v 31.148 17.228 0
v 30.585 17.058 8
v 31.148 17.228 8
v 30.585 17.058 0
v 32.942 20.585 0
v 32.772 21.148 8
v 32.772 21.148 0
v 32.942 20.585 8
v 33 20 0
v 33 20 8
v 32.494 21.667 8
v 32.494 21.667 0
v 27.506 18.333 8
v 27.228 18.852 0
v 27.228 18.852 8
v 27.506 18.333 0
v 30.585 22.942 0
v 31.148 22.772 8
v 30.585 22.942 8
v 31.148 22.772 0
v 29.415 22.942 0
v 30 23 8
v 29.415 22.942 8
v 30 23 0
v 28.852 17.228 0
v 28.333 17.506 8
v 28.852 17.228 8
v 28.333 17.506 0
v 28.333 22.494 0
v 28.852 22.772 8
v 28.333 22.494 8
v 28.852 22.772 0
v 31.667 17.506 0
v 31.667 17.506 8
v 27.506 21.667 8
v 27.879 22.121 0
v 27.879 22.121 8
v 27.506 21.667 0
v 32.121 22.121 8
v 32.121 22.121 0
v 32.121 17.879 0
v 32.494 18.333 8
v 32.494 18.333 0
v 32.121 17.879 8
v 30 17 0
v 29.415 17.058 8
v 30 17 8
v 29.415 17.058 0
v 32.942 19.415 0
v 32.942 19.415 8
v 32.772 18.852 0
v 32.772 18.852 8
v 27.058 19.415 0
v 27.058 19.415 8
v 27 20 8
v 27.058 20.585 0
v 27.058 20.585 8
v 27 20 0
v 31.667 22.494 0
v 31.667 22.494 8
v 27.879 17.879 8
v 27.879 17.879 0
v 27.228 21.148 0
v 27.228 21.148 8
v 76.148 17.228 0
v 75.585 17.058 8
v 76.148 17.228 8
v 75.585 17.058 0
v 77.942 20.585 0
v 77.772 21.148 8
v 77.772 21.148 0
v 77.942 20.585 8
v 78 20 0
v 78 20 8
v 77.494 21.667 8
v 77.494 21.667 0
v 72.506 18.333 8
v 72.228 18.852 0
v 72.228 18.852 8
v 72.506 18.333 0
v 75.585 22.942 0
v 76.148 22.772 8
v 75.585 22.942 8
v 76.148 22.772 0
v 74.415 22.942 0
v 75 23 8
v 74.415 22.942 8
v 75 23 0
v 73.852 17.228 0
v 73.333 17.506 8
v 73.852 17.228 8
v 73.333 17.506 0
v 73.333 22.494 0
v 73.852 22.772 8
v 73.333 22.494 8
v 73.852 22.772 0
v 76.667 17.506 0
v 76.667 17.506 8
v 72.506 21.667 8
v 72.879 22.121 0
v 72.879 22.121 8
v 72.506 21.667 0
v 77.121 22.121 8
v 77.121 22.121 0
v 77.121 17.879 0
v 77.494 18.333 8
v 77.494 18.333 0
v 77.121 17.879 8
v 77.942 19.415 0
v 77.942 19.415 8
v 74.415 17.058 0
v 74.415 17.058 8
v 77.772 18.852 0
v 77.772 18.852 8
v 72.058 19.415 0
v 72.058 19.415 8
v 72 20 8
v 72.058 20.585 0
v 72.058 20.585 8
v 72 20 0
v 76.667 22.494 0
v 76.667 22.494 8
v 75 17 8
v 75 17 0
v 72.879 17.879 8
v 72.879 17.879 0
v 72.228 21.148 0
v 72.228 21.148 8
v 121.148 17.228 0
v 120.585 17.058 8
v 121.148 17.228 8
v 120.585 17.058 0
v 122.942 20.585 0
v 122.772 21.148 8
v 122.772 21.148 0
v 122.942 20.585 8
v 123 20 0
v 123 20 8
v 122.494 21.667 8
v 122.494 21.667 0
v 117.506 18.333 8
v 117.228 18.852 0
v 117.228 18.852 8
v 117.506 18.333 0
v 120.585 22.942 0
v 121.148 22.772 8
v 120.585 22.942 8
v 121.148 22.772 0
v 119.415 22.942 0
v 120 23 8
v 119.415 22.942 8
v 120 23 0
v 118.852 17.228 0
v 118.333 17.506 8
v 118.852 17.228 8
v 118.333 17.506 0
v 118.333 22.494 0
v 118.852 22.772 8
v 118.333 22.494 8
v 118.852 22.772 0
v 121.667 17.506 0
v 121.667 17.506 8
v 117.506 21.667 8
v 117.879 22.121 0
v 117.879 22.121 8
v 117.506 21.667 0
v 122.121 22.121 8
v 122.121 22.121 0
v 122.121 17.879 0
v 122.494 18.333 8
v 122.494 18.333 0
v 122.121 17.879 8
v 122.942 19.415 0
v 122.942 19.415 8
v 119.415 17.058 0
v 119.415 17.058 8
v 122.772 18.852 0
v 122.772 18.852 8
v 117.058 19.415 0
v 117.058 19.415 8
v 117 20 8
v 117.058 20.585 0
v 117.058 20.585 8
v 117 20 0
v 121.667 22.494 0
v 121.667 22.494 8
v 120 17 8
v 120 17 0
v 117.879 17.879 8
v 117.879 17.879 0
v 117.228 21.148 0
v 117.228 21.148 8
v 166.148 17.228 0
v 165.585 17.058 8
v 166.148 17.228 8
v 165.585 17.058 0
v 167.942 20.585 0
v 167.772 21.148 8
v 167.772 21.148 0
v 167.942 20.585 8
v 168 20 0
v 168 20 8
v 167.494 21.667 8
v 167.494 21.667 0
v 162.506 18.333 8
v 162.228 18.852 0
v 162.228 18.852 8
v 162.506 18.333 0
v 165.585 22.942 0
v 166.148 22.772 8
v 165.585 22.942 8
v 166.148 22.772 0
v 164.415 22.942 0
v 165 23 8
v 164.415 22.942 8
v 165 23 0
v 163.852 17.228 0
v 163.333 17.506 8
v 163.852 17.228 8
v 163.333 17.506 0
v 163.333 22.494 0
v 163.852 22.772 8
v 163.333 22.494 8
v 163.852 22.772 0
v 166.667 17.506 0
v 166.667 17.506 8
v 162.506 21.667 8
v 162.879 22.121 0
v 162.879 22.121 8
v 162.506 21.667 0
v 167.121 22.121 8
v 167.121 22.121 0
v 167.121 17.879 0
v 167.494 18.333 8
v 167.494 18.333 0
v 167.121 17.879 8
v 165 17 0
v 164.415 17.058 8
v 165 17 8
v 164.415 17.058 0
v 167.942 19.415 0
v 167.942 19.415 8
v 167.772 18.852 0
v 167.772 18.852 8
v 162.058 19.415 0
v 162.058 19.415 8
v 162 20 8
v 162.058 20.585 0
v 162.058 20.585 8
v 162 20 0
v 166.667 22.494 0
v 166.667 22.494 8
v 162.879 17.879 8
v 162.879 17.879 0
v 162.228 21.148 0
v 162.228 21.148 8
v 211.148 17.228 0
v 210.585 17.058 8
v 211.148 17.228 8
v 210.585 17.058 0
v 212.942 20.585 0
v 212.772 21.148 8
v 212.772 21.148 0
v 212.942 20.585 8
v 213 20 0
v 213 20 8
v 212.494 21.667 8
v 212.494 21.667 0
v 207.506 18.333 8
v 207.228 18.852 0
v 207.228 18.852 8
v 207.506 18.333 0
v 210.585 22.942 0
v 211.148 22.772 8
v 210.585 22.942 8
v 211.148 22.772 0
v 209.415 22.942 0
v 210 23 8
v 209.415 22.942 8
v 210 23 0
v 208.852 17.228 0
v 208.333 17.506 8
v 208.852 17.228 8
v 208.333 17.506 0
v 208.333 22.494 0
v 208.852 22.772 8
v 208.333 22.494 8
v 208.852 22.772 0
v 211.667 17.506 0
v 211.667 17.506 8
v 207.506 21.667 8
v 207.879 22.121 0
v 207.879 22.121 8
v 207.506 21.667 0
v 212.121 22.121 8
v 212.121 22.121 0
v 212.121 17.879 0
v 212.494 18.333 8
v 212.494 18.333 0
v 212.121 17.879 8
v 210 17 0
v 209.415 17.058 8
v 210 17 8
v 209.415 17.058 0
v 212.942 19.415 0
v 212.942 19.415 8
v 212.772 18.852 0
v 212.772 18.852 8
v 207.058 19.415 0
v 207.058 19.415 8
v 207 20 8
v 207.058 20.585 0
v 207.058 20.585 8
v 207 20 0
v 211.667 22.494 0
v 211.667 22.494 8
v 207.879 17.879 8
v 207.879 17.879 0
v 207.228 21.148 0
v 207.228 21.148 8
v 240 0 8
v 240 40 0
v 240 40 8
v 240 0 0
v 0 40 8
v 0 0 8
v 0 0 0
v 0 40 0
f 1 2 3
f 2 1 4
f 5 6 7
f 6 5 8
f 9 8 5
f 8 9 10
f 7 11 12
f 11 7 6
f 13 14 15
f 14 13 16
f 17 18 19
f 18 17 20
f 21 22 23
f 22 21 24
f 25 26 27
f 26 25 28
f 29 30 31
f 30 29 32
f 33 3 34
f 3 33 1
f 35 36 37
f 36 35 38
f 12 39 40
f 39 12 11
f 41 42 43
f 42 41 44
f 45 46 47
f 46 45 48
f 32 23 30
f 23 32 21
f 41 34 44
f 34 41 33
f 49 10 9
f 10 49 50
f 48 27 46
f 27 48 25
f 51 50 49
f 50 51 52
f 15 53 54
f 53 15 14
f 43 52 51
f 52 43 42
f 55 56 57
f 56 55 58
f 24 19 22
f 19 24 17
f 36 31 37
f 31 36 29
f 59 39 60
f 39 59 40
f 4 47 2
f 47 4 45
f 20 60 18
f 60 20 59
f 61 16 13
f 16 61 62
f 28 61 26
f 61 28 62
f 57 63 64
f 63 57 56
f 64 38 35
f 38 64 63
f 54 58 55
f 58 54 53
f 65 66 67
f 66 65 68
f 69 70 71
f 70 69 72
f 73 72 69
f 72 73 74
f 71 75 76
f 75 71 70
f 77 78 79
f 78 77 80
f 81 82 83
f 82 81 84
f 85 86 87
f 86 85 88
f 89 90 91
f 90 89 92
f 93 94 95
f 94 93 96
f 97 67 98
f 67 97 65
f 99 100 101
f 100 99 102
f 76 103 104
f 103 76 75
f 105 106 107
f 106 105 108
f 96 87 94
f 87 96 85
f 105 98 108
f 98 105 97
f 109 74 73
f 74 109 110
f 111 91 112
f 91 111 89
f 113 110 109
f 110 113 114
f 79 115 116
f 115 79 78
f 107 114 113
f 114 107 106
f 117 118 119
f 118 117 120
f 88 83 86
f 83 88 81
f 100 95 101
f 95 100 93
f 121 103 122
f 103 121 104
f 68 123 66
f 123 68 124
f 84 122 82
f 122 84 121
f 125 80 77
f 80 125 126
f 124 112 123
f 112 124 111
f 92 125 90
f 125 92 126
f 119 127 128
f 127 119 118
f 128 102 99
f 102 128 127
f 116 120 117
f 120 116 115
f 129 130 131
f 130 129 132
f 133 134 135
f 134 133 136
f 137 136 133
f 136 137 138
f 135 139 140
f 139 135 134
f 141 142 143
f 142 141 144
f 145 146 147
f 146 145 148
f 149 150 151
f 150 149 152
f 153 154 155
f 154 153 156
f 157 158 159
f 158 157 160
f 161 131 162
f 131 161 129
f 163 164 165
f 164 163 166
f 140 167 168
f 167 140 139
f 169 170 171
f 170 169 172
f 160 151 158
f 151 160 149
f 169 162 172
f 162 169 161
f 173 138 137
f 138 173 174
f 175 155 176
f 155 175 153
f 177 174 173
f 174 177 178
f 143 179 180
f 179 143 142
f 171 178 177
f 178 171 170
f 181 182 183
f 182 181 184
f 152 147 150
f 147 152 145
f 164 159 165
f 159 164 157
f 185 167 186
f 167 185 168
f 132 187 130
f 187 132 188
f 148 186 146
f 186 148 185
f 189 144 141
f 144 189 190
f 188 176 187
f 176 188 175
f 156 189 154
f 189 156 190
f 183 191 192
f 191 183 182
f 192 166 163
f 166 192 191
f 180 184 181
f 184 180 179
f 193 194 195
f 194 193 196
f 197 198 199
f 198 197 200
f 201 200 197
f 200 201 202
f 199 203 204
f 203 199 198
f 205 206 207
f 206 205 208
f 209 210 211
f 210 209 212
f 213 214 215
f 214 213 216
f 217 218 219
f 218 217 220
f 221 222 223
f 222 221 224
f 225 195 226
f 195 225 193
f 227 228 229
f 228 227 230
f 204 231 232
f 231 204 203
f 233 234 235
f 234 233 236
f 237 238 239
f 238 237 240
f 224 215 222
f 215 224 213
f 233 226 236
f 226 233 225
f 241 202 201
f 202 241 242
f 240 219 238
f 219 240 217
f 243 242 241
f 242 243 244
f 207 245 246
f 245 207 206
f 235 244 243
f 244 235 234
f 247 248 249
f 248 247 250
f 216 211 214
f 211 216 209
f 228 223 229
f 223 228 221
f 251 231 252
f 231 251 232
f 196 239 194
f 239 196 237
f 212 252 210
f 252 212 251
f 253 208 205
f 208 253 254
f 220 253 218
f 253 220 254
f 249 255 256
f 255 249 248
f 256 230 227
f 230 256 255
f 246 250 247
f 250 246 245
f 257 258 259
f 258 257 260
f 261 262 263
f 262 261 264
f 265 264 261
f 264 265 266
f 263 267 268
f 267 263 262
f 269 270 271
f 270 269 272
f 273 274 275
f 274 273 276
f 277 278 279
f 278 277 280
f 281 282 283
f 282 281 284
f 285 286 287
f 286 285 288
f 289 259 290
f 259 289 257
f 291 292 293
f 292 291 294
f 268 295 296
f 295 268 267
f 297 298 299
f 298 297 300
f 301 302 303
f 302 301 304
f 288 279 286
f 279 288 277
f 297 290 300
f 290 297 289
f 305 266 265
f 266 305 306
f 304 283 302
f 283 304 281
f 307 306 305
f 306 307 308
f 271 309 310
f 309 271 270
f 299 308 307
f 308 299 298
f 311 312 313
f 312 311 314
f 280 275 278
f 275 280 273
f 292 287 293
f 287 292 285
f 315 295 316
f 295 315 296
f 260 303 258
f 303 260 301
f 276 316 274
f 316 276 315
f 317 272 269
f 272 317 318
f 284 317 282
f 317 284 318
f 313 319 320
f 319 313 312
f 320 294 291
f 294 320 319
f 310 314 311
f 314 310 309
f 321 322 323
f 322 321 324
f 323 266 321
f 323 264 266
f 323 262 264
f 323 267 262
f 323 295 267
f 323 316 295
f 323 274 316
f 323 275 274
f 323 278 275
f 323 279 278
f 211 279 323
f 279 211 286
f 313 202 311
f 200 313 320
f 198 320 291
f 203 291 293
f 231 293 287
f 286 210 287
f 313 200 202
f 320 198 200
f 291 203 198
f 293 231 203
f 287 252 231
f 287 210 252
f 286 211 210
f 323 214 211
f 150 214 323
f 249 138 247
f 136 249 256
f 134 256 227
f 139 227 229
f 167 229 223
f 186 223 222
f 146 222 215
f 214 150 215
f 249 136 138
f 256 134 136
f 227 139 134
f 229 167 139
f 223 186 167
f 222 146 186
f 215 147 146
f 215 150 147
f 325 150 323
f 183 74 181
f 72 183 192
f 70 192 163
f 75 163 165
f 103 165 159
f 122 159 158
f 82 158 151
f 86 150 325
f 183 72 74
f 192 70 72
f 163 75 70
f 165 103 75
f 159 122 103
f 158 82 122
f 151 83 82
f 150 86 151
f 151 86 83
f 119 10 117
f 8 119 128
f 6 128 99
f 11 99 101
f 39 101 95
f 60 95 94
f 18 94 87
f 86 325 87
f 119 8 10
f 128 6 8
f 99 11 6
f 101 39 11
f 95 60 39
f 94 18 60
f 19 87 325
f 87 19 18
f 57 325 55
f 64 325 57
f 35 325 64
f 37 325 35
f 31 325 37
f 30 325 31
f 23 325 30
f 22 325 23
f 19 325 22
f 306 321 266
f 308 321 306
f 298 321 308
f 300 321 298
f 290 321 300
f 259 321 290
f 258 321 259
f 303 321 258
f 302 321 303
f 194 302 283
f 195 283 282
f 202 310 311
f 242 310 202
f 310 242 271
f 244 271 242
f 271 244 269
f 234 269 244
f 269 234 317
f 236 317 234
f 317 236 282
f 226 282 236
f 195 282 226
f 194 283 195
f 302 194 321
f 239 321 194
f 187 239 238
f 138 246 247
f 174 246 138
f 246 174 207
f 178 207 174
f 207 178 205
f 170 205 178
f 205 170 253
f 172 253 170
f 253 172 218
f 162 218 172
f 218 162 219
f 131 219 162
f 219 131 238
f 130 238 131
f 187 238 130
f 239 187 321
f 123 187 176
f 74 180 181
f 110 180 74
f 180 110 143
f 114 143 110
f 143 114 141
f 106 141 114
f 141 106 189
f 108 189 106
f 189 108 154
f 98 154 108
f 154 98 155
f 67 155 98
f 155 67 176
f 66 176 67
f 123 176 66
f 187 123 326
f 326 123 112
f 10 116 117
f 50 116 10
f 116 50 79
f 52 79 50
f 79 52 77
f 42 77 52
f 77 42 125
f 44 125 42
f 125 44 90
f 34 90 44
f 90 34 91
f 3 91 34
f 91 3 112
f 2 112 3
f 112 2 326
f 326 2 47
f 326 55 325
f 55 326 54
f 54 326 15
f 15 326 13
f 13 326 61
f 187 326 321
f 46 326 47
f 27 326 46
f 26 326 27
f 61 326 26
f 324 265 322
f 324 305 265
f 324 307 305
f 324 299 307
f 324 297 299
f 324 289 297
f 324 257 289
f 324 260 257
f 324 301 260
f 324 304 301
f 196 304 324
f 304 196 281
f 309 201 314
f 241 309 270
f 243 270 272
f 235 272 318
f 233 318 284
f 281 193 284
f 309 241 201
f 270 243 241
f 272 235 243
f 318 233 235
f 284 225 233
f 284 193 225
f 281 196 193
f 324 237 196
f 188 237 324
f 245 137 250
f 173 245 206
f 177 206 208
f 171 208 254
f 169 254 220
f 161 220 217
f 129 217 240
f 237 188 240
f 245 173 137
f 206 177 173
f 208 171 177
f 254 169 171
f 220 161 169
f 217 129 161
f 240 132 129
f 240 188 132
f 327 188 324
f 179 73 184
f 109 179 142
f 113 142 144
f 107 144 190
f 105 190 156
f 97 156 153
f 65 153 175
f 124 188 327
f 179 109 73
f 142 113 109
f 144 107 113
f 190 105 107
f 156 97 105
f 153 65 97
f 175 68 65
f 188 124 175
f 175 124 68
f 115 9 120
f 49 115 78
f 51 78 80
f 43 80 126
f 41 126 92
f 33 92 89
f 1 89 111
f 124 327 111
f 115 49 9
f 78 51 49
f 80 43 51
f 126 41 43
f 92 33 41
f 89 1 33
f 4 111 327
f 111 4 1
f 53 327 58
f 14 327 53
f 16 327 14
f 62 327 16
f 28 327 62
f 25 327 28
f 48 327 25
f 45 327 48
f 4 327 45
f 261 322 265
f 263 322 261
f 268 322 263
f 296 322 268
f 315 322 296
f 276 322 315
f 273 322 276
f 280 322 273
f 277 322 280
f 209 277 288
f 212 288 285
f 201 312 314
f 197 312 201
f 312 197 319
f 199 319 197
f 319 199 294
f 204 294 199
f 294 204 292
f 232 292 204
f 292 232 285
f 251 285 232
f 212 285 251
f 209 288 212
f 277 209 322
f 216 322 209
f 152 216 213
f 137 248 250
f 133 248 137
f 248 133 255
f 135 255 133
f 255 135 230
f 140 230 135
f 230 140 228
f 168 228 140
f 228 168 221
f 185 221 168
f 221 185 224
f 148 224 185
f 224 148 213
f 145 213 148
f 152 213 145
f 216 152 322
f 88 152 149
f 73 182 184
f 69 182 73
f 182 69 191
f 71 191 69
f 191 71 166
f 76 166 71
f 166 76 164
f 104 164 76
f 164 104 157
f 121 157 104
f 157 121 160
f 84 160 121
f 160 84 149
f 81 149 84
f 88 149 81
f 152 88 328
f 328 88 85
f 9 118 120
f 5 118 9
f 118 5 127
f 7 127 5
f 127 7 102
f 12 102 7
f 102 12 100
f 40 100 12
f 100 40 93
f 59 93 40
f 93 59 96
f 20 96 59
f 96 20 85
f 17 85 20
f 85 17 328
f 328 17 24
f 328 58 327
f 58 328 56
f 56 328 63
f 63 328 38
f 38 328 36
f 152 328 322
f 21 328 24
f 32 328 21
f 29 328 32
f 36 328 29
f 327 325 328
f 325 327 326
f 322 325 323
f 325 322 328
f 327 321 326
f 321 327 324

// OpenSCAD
$fn = 32;

// ----------------------------------------------------------------------
// Long rail: 200-250 mm mounting rail
// ----------------------------------------------------------------------

// --- parameters (mm) ---
rail_l = 240;             // rail length, X
rail_w = 40;              // rail width, Y
rail_t = 8;               // rail thickness, Z
hole_d = 6;               // mounting hole diameter
hole_start = 30;          // first hole offset from the end
hole_pitch = 45;          // hole pitch
holes = 5;                // number of holes
fit_tol = 0.02;           // tolerance for press fits, mm
free_tol = 0.2;           // tolerance for clearance fits, mm

difference() {
  cube([rail_l, rail_w, rail_t]);
  for (i = [0 : holes - 1])
    translate([hole_start + i * hole_pitch, rail_w / 2, -1])
      cylinder(h = rail_t + 2, d = hole_d);
}
